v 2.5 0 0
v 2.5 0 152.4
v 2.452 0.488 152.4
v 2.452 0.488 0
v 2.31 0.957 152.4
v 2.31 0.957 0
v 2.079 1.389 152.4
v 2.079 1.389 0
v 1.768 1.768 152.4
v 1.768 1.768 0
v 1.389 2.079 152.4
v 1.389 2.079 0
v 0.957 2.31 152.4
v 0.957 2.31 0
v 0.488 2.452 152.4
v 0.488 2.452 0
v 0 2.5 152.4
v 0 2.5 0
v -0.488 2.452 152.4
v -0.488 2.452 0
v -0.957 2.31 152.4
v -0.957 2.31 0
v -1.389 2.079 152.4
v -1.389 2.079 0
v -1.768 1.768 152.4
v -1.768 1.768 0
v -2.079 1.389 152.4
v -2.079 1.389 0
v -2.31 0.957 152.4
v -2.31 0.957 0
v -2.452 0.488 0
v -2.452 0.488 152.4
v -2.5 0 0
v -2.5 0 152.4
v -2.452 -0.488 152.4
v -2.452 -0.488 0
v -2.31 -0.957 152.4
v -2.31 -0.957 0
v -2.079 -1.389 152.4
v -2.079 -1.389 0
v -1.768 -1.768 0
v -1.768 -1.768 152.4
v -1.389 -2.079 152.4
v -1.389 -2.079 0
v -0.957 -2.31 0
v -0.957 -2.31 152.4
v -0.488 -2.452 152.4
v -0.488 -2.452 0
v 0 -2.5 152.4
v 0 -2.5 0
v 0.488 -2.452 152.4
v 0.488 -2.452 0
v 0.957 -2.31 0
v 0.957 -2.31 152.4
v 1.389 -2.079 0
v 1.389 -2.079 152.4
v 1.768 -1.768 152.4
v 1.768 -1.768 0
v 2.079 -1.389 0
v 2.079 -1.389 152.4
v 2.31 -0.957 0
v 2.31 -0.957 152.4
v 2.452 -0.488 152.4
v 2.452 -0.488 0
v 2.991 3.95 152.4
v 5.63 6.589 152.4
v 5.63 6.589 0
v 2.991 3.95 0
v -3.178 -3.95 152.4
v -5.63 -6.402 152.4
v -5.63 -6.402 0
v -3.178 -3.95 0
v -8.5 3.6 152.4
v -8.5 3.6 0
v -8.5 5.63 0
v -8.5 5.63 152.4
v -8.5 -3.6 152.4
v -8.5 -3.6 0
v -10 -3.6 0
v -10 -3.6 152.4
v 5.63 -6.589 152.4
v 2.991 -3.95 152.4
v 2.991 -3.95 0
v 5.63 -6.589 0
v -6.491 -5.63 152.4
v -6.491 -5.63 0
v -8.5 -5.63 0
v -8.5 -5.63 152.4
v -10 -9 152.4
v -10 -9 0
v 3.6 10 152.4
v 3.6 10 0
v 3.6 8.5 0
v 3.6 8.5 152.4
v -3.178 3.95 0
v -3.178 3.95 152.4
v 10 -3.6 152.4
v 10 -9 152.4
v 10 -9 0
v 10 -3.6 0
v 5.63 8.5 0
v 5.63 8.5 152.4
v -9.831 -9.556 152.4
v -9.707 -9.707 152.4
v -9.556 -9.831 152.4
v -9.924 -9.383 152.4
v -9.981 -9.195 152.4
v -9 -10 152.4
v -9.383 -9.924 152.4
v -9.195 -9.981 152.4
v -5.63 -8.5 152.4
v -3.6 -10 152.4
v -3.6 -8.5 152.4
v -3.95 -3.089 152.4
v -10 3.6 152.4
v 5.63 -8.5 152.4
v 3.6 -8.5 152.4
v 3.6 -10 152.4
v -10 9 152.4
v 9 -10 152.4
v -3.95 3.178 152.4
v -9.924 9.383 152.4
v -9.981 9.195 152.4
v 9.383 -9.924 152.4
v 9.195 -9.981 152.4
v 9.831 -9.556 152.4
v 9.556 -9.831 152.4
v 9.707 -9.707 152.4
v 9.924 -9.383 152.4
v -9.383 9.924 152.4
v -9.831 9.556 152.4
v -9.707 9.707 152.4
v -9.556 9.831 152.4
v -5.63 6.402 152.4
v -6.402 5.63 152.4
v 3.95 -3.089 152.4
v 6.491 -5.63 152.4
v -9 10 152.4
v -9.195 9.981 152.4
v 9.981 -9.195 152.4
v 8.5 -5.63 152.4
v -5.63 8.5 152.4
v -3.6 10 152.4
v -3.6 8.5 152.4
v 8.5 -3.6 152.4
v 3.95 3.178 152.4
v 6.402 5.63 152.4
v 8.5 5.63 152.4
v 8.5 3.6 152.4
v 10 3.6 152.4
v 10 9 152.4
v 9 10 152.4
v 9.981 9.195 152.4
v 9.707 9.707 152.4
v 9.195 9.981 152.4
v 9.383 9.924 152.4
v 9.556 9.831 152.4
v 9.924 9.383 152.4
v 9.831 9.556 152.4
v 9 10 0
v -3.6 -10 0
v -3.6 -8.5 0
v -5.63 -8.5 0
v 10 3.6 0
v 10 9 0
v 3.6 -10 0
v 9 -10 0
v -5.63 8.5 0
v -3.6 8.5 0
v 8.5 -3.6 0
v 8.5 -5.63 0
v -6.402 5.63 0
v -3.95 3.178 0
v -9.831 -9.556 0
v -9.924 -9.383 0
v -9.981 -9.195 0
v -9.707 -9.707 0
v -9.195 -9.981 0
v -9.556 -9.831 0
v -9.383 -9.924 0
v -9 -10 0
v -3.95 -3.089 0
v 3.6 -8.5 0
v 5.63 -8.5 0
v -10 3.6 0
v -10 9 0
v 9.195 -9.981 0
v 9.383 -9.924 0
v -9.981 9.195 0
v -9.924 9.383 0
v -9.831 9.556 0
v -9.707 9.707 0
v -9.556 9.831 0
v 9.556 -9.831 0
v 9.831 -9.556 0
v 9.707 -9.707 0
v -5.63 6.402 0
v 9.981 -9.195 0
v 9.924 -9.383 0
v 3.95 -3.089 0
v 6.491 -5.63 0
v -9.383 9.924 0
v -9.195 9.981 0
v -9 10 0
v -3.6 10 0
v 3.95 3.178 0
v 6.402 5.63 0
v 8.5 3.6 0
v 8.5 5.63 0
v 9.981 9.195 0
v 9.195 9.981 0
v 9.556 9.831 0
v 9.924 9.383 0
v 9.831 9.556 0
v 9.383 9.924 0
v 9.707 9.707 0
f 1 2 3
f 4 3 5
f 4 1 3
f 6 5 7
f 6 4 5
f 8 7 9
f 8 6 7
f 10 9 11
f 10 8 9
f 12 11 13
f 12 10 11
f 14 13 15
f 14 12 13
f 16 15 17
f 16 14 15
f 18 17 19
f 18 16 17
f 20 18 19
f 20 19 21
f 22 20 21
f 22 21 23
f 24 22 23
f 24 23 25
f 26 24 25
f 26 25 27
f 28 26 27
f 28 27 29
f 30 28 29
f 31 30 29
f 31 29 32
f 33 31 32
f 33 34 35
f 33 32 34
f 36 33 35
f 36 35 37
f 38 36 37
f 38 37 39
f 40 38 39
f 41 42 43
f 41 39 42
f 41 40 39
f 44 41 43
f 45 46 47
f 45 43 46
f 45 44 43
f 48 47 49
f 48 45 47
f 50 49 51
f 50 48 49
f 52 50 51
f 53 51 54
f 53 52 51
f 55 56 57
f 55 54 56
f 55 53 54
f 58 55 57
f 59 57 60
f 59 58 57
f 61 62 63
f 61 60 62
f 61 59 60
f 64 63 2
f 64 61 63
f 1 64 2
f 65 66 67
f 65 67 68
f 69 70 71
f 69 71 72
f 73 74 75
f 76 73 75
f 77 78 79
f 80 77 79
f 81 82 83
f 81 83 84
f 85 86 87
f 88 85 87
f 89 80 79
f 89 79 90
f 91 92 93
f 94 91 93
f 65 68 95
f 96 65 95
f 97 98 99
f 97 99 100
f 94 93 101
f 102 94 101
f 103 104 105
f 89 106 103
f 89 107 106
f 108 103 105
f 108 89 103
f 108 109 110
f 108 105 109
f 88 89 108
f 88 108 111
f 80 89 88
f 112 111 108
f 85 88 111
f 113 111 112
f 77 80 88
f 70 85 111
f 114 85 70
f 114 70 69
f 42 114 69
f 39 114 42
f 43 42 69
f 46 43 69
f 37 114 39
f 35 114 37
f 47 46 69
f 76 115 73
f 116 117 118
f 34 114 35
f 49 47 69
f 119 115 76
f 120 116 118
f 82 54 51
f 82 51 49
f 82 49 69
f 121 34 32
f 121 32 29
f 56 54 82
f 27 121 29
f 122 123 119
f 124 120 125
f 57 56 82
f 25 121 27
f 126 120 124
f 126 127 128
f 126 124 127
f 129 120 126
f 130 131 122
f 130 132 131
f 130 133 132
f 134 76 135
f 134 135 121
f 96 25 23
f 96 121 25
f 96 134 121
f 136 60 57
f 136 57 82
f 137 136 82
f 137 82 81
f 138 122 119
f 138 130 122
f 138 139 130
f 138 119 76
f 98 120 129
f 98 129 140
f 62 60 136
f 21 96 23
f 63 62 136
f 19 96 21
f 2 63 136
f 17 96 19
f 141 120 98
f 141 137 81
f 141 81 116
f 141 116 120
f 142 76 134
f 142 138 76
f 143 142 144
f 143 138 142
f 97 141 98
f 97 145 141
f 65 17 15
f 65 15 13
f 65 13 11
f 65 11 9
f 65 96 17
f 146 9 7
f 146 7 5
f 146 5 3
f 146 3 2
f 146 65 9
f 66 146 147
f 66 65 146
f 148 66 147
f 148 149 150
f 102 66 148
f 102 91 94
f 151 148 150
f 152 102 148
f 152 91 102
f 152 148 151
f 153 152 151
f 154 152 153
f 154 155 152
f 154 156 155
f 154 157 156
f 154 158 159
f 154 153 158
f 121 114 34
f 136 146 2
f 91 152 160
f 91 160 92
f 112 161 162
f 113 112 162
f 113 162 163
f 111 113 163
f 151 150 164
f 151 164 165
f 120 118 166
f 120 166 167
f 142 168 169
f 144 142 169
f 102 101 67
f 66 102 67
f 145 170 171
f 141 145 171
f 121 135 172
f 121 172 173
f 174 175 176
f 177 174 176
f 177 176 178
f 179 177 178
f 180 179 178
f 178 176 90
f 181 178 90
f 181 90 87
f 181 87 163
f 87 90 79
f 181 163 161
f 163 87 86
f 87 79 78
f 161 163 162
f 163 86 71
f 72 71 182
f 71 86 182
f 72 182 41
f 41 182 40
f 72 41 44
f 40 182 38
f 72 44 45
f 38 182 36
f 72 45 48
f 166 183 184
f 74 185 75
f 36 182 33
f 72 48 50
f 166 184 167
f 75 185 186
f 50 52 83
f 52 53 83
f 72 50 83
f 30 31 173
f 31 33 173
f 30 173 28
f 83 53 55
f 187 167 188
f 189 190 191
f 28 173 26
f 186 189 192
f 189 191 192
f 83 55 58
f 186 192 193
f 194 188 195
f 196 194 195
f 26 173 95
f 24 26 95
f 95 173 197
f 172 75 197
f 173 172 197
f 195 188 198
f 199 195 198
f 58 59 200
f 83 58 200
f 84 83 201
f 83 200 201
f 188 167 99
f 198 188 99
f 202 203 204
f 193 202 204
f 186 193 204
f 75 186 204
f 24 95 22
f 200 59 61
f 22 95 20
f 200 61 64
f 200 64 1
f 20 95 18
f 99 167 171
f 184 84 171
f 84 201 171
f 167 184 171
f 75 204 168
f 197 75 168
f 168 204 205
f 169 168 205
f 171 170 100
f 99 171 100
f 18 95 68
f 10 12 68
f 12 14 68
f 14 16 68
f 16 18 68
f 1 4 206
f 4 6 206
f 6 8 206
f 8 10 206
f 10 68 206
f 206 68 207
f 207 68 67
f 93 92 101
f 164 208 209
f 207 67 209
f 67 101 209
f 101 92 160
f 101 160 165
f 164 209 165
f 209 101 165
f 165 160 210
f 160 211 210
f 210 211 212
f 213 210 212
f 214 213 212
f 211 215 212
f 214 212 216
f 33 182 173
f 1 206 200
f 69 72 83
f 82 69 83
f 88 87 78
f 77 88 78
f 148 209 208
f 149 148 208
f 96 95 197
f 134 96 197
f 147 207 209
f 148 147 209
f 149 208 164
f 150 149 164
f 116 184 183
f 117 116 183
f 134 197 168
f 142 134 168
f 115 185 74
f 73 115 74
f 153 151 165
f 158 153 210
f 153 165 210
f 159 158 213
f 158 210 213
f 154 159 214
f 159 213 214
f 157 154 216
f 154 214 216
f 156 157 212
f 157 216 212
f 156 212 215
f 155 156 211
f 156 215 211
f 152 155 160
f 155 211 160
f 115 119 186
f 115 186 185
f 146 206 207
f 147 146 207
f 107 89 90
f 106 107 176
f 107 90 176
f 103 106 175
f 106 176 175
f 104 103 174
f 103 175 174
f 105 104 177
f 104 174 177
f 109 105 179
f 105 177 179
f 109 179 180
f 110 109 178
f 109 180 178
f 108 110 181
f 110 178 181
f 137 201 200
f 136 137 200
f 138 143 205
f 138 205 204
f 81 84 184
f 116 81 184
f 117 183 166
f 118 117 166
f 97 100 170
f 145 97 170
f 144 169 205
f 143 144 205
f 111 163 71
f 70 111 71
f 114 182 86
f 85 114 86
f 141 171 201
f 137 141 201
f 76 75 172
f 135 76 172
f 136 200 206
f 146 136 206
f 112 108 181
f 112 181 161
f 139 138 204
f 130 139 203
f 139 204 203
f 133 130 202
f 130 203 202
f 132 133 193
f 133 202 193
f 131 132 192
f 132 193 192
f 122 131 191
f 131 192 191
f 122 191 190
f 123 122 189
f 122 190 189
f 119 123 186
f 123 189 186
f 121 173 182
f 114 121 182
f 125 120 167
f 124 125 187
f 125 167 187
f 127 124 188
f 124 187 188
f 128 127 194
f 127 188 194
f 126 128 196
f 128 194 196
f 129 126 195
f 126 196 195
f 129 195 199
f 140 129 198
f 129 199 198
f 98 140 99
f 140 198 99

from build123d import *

# Parameters (mm, degrees)
SKETCH1_R           = 2.5
BOSS_EXTRUDE1_DEPTH = 482.6
SKETCH2_W           = 61.361470627
SKETCH2_H           = 380.25471835
CUT_EXTRUDE1_DEPTH  = 21


with BuildPart() as part:
    # Sketch1 → Boss-Extrude1 (new body)
    with BuildSketch(Plane.XY):
        with BuildLine():
            Line((-5.63, 10), (-9, 10))
            ThreePointArc((-9, 10), (-9.707106781, 9.707106781), (-10, 9))
            Line((-10, 9), (-10, 5.63))
            Line((-10, 5.63), (-10, 3.6))
            Line((-10, 3.6), (-8.5, 3.6))
            Line((-8.5, 3.6), (-8.5, 5.63))
            Line((-8.5, 5.63), (-6.402046573, 5.63))
            Line((-6.402046573, 5.63), (-3.95, 3.177953427))
            Line((-3.95, 3.177953427), (-3.95, -3.088580227))
            Line((-3.95, -3.088580227), (-6.491419773, -5.63))
            Line((-6.491419773, -5.63), (-8.5, -5.63))
            Line((-8.5, -5.63), (-8.5, -3.6))
            Line((-8.5, -3.6), (-10, -3.6))
            Line((-10, -3.6), (-10, -5.63))
            Line((-10, -5.63), (-10, -9))
            ThreePointArc((-10, -9), (-9.707106781, -9.707106781), (-9, -10))
            Line((-9, -10), (-5.63, -10))
            Line((-5.63, -10), (-3.6, -10))
            Line((-3.6, -10), (-3.6, -8.5))
            Line((-3.6, -8.5), (-5.63, -8.5))
            Line((-5.63, -8.5), (-5.63, -6.402046573))
            Line((-5.63, -6.402046573), (-3.177953427, -3.95))
            Line((-3.177953427, -3.95), (2.991333041, -3.95))
            Line((2.991333041, -3.95), (5.63, -6.588666959))
            Line((5.63, -6.588666959), (5.63, -8.5))
            Line((5.63, -8.5), (3.6, -8.5))
            Line((3.6, -8.5), (3.6, -10))
            Line((3.6, -10), (5.63, -10))
            Line((5.63, -10), (9, -10))
            ThreePointArc((9, -10), (9.707106781, -9.707106781), (10, -9))
            Line((10, -9), (10, -5.63))
            Line((10, -5.63), (10, -3.6))
            Line((10, -3.6), (8.5, -3.6))
            Line((8.5, -3.6), (8.5, -5.63))
            Line((8.5, -5.63), (6.491419773, -5.63))
            Line((6.491419773, -5.63), (3.95, -3.088580227))
            Line((3.95, -3.088580227), (3.95, 3.177953427))
            Line((3.95, 3.177953427), (6.402046573, 5.63))
            Line((6.402046573, 5.63), (8.5, 5.63))
            Line((8.5, 5.63), (8.5, 3.6))
            Line((8.5, 3.6), (10, 3.6))
            Line((10, 3.6), (10, 5.63))
            Line((10, 5.63), (10, 9))
            ThreePointArc((10, 9), (9.707106781, 9.707106781), (9, 10))
            Line((9, 10), (5.63, 10))
            Line((5.63, 10), (3.6, 10))
            Line((3.6, 10), (3.6, 8.5))
            Line((3.6, 8.5), (5.63, 8.5))
            Line((5.63, 8.5), (5.63, 6.588666959))
            Line((5.63, 6.588666959), (2.991333041, 3.95))
            Line((2.991333041, 3.95), (-3.177953427, 3.95))
            Line((-3.177953427, 3.95), (-5.63, 6.402046573))
            Line((-5.63, 6.402046573), (-5.63, 8.5))
            Line((-5.63, 8.5), (-3.6, 8.5))
            Line((-3.6, 8.5), (-3.6, 10))
            Line((-3.6, 10), (-5.63, 10))
        make_face()
        Circle(SKETCH1_R, mode=Mode.SUBTRACT)
    extrude(amount=BOSS_EXTRUDE1_DEPTH)

    # Sketch2 → Cut-Extrude1 (cut, through all)
    with BuildSketch(Plane(origin=(0, 10, 0), x_dir=(1, 0, 0), z_dir=(0, 1, 0))):
        with Locations((14.074869471, -342.527359175)):
            Rectangle(SKETCH2_W, SKETCH2_H)
    extrude(amount=-CUT_EXTRUDE1_DEPTH, mode=Mode.SUBTRACT)


solid = part.part
